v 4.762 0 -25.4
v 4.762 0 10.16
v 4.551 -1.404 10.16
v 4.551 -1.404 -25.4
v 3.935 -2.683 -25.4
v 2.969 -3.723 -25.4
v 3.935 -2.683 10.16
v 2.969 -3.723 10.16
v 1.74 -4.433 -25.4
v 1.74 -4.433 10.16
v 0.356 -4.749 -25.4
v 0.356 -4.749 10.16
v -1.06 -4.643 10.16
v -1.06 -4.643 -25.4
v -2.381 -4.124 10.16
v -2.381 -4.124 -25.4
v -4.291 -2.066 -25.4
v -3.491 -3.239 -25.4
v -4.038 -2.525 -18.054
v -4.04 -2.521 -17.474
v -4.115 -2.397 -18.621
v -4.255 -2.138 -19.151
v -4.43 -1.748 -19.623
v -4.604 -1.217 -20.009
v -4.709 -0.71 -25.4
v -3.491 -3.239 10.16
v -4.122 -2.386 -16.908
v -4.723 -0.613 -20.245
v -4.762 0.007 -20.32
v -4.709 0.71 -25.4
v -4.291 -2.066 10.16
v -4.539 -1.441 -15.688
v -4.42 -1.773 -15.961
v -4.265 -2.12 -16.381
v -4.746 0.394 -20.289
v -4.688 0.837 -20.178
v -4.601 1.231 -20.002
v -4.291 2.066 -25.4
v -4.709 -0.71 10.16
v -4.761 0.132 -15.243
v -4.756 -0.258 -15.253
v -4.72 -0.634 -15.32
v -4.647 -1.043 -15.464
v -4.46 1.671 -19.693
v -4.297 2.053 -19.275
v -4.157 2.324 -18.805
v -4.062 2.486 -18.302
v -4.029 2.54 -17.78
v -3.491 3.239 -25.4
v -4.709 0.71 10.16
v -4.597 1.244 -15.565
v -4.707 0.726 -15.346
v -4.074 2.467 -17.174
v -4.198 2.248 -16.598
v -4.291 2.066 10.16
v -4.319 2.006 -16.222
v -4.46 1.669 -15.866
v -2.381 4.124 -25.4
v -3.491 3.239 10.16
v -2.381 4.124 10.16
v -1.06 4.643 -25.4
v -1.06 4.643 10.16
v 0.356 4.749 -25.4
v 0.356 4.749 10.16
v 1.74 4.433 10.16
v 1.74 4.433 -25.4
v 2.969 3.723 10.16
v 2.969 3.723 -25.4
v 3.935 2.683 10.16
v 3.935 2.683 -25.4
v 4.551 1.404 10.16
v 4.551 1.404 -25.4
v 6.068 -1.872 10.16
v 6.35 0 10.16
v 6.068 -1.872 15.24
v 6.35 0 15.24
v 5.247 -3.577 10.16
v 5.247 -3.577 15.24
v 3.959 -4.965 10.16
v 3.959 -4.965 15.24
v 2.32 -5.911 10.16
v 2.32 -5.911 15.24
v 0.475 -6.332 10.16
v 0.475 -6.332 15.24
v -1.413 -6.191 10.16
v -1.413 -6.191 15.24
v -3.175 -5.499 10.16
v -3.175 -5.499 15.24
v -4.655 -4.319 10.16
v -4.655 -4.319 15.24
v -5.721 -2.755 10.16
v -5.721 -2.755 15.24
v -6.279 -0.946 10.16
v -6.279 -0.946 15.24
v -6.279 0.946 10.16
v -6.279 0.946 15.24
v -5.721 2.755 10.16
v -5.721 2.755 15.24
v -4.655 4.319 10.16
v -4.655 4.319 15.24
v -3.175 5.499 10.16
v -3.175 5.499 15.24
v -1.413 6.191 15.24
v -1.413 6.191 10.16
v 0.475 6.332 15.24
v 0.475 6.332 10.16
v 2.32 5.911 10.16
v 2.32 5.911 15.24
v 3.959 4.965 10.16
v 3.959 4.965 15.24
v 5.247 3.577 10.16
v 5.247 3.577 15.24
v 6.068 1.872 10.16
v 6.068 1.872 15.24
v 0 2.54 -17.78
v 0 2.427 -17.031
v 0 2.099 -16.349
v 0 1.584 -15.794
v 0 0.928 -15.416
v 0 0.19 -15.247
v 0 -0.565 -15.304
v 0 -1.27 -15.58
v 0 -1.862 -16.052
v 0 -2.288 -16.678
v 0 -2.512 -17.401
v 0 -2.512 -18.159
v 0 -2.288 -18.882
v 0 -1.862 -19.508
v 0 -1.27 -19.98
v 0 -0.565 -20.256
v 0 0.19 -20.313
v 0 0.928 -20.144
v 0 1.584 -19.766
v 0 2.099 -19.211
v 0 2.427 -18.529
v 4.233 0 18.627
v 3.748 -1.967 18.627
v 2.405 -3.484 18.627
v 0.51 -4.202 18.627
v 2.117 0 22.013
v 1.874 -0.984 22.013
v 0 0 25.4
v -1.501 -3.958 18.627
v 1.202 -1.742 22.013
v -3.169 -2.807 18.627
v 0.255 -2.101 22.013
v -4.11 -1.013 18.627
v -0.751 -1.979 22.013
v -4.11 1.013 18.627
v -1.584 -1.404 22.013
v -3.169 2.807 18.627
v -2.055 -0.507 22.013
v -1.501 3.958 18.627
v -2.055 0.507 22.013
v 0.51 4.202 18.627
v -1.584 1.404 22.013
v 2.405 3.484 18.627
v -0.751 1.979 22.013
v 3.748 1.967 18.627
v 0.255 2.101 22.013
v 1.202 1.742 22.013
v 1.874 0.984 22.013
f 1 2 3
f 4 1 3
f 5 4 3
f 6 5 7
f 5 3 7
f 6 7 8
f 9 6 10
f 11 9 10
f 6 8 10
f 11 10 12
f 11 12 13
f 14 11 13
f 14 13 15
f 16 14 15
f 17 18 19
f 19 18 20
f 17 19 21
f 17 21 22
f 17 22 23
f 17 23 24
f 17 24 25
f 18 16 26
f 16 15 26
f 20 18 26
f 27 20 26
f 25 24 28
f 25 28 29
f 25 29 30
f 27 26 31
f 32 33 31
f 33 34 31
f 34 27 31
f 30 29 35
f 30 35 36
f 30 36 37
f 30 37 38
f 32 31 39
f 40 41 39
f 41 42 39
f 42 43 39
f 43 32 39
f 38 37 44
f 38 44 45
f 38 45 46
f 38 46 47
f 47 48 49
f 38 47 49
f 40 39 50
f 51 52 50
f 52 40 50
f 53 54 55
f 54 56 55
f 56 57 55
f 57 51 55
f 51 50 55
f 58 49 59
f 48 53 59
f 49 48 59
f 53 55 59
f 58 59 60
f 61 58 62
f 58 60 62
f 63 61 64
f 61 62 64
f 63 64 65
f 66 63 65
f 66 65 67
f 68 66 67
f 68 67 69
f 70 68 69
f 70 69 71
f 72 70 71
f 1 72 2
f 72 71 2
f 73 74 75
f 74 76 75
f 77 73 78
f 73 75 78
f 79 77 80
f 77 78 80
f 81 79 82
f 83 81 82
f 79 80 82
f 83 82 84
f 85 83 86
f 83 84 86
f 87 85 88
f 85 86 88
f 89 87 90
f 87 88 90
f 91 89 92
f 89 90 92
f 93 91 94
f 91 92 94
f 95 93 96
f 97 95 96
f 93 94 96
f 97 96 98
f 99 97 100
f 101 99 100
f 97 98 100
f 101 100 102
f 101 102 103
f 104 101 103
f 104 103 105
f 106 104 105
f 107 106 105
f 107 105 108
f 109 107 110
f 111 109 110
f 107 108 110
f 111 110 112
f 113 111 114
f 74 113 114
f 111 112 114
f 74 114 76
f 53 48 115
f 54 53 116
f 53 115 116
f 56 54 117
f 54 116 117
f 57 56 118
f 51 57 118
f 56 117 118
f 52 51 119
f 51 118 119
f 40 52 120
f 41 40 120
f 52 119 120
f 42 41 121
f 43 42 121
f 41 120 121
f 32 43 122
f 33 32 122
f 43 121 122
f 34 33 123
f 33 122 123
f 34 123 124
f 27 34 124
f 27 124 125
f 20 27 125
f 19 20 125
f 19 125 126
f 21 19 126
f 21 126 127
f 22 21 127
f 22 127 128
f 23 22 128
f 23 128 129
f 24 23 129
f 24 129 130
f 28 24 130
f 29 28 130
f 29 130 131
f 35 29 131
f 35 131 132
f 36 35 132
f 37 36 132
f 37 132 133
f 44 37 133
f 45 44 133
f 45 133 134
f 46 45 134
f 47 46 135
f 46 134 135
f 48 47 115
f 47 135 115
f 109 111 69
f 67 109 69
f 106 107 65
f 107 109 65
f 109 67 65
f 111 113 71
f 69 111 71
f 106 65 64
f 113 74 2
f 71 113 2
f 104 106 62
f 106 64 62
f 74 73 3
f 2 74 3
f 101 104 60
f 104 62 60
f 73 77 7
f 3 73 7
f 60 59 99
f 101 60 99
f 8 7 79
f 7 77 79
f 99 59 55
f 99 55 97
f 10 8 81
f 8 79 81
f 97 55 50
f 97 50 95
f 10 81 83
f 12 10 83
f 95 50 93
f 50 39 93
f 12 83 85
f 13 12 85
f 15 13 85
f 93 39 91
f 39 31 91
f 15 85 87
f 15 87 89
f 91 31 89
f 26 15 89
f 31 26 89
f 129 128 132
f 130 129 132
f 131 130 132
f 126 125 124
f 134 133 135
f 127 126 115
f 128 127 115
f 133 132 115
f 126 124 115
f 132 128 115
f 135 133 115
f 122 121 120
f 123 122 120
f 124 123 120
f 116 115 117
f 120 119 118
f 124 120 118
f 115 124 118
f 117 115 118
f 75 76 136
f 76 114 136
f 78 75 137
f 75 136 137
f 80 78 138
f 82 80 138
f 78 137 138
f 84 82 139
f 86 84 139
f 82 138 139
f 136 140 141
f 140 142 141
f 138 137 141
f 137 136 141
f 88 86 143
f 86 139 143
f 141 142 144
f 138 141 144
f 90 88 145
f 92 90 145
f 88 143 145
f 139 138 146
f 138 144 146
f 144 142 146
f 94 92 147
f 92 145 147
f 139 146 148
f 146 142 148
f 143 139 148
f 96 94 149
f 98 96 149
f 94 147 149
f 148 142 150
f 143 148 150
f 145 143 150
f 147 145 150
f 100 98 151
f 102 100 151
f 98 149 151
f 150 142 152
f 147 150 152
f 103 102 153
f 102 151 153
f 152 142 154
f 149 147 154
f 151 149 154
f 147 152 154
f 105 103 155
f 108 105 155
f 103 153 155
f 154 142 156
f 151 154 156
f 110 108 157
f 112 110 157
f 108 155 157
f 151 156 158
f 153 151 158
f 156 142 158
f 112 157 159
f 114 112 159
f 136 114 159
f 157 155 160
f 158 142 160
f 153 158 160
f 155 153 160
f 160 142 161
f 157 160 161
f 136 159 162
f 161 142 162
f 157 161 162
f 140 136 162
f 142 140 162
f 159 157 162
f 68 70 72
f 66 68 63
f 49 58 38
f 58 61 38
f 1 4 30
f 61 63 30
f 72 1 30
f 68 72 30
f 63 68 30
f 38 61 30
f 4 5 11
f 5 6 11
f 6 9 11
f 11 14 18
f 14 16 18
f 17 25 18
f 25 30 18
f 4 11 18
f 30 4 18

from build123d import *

# Parameters (mm, degrees)
F0_W     = 4.7625
F0_H     = 35.56
F2_R     = 2.54
F3_DEPTH = 7.62


with BuildPart() as f1:
    # F0 (on Front) → F1 (revolve)
    with BuildSketch(Plane.XZ):
        Polygon((0, 25.4), (0, 15.24), (6.35, 15.24), align=None)
        Polygon((0, 10.16), (4.7625, 10.16), (6.35, 10.16), (6.35, 15.24), (0, 15.24), align=None)
        with Locations((2.38125, -7.62)):
            Rectangle(F0_W, F0_H)
    revolve(axis=Axis((0, 0, 0), (0, 0, -1)))

    # F2 (on Right) → F3 (cut)
    with BuildSketch(Plane.YZ):
        with Locations((0, -17.78)):
            Circle(F2_R)
    extrude(amount=-F3_DEPTH, mode=Mode.SUBTRACT)


solid = f1.part
